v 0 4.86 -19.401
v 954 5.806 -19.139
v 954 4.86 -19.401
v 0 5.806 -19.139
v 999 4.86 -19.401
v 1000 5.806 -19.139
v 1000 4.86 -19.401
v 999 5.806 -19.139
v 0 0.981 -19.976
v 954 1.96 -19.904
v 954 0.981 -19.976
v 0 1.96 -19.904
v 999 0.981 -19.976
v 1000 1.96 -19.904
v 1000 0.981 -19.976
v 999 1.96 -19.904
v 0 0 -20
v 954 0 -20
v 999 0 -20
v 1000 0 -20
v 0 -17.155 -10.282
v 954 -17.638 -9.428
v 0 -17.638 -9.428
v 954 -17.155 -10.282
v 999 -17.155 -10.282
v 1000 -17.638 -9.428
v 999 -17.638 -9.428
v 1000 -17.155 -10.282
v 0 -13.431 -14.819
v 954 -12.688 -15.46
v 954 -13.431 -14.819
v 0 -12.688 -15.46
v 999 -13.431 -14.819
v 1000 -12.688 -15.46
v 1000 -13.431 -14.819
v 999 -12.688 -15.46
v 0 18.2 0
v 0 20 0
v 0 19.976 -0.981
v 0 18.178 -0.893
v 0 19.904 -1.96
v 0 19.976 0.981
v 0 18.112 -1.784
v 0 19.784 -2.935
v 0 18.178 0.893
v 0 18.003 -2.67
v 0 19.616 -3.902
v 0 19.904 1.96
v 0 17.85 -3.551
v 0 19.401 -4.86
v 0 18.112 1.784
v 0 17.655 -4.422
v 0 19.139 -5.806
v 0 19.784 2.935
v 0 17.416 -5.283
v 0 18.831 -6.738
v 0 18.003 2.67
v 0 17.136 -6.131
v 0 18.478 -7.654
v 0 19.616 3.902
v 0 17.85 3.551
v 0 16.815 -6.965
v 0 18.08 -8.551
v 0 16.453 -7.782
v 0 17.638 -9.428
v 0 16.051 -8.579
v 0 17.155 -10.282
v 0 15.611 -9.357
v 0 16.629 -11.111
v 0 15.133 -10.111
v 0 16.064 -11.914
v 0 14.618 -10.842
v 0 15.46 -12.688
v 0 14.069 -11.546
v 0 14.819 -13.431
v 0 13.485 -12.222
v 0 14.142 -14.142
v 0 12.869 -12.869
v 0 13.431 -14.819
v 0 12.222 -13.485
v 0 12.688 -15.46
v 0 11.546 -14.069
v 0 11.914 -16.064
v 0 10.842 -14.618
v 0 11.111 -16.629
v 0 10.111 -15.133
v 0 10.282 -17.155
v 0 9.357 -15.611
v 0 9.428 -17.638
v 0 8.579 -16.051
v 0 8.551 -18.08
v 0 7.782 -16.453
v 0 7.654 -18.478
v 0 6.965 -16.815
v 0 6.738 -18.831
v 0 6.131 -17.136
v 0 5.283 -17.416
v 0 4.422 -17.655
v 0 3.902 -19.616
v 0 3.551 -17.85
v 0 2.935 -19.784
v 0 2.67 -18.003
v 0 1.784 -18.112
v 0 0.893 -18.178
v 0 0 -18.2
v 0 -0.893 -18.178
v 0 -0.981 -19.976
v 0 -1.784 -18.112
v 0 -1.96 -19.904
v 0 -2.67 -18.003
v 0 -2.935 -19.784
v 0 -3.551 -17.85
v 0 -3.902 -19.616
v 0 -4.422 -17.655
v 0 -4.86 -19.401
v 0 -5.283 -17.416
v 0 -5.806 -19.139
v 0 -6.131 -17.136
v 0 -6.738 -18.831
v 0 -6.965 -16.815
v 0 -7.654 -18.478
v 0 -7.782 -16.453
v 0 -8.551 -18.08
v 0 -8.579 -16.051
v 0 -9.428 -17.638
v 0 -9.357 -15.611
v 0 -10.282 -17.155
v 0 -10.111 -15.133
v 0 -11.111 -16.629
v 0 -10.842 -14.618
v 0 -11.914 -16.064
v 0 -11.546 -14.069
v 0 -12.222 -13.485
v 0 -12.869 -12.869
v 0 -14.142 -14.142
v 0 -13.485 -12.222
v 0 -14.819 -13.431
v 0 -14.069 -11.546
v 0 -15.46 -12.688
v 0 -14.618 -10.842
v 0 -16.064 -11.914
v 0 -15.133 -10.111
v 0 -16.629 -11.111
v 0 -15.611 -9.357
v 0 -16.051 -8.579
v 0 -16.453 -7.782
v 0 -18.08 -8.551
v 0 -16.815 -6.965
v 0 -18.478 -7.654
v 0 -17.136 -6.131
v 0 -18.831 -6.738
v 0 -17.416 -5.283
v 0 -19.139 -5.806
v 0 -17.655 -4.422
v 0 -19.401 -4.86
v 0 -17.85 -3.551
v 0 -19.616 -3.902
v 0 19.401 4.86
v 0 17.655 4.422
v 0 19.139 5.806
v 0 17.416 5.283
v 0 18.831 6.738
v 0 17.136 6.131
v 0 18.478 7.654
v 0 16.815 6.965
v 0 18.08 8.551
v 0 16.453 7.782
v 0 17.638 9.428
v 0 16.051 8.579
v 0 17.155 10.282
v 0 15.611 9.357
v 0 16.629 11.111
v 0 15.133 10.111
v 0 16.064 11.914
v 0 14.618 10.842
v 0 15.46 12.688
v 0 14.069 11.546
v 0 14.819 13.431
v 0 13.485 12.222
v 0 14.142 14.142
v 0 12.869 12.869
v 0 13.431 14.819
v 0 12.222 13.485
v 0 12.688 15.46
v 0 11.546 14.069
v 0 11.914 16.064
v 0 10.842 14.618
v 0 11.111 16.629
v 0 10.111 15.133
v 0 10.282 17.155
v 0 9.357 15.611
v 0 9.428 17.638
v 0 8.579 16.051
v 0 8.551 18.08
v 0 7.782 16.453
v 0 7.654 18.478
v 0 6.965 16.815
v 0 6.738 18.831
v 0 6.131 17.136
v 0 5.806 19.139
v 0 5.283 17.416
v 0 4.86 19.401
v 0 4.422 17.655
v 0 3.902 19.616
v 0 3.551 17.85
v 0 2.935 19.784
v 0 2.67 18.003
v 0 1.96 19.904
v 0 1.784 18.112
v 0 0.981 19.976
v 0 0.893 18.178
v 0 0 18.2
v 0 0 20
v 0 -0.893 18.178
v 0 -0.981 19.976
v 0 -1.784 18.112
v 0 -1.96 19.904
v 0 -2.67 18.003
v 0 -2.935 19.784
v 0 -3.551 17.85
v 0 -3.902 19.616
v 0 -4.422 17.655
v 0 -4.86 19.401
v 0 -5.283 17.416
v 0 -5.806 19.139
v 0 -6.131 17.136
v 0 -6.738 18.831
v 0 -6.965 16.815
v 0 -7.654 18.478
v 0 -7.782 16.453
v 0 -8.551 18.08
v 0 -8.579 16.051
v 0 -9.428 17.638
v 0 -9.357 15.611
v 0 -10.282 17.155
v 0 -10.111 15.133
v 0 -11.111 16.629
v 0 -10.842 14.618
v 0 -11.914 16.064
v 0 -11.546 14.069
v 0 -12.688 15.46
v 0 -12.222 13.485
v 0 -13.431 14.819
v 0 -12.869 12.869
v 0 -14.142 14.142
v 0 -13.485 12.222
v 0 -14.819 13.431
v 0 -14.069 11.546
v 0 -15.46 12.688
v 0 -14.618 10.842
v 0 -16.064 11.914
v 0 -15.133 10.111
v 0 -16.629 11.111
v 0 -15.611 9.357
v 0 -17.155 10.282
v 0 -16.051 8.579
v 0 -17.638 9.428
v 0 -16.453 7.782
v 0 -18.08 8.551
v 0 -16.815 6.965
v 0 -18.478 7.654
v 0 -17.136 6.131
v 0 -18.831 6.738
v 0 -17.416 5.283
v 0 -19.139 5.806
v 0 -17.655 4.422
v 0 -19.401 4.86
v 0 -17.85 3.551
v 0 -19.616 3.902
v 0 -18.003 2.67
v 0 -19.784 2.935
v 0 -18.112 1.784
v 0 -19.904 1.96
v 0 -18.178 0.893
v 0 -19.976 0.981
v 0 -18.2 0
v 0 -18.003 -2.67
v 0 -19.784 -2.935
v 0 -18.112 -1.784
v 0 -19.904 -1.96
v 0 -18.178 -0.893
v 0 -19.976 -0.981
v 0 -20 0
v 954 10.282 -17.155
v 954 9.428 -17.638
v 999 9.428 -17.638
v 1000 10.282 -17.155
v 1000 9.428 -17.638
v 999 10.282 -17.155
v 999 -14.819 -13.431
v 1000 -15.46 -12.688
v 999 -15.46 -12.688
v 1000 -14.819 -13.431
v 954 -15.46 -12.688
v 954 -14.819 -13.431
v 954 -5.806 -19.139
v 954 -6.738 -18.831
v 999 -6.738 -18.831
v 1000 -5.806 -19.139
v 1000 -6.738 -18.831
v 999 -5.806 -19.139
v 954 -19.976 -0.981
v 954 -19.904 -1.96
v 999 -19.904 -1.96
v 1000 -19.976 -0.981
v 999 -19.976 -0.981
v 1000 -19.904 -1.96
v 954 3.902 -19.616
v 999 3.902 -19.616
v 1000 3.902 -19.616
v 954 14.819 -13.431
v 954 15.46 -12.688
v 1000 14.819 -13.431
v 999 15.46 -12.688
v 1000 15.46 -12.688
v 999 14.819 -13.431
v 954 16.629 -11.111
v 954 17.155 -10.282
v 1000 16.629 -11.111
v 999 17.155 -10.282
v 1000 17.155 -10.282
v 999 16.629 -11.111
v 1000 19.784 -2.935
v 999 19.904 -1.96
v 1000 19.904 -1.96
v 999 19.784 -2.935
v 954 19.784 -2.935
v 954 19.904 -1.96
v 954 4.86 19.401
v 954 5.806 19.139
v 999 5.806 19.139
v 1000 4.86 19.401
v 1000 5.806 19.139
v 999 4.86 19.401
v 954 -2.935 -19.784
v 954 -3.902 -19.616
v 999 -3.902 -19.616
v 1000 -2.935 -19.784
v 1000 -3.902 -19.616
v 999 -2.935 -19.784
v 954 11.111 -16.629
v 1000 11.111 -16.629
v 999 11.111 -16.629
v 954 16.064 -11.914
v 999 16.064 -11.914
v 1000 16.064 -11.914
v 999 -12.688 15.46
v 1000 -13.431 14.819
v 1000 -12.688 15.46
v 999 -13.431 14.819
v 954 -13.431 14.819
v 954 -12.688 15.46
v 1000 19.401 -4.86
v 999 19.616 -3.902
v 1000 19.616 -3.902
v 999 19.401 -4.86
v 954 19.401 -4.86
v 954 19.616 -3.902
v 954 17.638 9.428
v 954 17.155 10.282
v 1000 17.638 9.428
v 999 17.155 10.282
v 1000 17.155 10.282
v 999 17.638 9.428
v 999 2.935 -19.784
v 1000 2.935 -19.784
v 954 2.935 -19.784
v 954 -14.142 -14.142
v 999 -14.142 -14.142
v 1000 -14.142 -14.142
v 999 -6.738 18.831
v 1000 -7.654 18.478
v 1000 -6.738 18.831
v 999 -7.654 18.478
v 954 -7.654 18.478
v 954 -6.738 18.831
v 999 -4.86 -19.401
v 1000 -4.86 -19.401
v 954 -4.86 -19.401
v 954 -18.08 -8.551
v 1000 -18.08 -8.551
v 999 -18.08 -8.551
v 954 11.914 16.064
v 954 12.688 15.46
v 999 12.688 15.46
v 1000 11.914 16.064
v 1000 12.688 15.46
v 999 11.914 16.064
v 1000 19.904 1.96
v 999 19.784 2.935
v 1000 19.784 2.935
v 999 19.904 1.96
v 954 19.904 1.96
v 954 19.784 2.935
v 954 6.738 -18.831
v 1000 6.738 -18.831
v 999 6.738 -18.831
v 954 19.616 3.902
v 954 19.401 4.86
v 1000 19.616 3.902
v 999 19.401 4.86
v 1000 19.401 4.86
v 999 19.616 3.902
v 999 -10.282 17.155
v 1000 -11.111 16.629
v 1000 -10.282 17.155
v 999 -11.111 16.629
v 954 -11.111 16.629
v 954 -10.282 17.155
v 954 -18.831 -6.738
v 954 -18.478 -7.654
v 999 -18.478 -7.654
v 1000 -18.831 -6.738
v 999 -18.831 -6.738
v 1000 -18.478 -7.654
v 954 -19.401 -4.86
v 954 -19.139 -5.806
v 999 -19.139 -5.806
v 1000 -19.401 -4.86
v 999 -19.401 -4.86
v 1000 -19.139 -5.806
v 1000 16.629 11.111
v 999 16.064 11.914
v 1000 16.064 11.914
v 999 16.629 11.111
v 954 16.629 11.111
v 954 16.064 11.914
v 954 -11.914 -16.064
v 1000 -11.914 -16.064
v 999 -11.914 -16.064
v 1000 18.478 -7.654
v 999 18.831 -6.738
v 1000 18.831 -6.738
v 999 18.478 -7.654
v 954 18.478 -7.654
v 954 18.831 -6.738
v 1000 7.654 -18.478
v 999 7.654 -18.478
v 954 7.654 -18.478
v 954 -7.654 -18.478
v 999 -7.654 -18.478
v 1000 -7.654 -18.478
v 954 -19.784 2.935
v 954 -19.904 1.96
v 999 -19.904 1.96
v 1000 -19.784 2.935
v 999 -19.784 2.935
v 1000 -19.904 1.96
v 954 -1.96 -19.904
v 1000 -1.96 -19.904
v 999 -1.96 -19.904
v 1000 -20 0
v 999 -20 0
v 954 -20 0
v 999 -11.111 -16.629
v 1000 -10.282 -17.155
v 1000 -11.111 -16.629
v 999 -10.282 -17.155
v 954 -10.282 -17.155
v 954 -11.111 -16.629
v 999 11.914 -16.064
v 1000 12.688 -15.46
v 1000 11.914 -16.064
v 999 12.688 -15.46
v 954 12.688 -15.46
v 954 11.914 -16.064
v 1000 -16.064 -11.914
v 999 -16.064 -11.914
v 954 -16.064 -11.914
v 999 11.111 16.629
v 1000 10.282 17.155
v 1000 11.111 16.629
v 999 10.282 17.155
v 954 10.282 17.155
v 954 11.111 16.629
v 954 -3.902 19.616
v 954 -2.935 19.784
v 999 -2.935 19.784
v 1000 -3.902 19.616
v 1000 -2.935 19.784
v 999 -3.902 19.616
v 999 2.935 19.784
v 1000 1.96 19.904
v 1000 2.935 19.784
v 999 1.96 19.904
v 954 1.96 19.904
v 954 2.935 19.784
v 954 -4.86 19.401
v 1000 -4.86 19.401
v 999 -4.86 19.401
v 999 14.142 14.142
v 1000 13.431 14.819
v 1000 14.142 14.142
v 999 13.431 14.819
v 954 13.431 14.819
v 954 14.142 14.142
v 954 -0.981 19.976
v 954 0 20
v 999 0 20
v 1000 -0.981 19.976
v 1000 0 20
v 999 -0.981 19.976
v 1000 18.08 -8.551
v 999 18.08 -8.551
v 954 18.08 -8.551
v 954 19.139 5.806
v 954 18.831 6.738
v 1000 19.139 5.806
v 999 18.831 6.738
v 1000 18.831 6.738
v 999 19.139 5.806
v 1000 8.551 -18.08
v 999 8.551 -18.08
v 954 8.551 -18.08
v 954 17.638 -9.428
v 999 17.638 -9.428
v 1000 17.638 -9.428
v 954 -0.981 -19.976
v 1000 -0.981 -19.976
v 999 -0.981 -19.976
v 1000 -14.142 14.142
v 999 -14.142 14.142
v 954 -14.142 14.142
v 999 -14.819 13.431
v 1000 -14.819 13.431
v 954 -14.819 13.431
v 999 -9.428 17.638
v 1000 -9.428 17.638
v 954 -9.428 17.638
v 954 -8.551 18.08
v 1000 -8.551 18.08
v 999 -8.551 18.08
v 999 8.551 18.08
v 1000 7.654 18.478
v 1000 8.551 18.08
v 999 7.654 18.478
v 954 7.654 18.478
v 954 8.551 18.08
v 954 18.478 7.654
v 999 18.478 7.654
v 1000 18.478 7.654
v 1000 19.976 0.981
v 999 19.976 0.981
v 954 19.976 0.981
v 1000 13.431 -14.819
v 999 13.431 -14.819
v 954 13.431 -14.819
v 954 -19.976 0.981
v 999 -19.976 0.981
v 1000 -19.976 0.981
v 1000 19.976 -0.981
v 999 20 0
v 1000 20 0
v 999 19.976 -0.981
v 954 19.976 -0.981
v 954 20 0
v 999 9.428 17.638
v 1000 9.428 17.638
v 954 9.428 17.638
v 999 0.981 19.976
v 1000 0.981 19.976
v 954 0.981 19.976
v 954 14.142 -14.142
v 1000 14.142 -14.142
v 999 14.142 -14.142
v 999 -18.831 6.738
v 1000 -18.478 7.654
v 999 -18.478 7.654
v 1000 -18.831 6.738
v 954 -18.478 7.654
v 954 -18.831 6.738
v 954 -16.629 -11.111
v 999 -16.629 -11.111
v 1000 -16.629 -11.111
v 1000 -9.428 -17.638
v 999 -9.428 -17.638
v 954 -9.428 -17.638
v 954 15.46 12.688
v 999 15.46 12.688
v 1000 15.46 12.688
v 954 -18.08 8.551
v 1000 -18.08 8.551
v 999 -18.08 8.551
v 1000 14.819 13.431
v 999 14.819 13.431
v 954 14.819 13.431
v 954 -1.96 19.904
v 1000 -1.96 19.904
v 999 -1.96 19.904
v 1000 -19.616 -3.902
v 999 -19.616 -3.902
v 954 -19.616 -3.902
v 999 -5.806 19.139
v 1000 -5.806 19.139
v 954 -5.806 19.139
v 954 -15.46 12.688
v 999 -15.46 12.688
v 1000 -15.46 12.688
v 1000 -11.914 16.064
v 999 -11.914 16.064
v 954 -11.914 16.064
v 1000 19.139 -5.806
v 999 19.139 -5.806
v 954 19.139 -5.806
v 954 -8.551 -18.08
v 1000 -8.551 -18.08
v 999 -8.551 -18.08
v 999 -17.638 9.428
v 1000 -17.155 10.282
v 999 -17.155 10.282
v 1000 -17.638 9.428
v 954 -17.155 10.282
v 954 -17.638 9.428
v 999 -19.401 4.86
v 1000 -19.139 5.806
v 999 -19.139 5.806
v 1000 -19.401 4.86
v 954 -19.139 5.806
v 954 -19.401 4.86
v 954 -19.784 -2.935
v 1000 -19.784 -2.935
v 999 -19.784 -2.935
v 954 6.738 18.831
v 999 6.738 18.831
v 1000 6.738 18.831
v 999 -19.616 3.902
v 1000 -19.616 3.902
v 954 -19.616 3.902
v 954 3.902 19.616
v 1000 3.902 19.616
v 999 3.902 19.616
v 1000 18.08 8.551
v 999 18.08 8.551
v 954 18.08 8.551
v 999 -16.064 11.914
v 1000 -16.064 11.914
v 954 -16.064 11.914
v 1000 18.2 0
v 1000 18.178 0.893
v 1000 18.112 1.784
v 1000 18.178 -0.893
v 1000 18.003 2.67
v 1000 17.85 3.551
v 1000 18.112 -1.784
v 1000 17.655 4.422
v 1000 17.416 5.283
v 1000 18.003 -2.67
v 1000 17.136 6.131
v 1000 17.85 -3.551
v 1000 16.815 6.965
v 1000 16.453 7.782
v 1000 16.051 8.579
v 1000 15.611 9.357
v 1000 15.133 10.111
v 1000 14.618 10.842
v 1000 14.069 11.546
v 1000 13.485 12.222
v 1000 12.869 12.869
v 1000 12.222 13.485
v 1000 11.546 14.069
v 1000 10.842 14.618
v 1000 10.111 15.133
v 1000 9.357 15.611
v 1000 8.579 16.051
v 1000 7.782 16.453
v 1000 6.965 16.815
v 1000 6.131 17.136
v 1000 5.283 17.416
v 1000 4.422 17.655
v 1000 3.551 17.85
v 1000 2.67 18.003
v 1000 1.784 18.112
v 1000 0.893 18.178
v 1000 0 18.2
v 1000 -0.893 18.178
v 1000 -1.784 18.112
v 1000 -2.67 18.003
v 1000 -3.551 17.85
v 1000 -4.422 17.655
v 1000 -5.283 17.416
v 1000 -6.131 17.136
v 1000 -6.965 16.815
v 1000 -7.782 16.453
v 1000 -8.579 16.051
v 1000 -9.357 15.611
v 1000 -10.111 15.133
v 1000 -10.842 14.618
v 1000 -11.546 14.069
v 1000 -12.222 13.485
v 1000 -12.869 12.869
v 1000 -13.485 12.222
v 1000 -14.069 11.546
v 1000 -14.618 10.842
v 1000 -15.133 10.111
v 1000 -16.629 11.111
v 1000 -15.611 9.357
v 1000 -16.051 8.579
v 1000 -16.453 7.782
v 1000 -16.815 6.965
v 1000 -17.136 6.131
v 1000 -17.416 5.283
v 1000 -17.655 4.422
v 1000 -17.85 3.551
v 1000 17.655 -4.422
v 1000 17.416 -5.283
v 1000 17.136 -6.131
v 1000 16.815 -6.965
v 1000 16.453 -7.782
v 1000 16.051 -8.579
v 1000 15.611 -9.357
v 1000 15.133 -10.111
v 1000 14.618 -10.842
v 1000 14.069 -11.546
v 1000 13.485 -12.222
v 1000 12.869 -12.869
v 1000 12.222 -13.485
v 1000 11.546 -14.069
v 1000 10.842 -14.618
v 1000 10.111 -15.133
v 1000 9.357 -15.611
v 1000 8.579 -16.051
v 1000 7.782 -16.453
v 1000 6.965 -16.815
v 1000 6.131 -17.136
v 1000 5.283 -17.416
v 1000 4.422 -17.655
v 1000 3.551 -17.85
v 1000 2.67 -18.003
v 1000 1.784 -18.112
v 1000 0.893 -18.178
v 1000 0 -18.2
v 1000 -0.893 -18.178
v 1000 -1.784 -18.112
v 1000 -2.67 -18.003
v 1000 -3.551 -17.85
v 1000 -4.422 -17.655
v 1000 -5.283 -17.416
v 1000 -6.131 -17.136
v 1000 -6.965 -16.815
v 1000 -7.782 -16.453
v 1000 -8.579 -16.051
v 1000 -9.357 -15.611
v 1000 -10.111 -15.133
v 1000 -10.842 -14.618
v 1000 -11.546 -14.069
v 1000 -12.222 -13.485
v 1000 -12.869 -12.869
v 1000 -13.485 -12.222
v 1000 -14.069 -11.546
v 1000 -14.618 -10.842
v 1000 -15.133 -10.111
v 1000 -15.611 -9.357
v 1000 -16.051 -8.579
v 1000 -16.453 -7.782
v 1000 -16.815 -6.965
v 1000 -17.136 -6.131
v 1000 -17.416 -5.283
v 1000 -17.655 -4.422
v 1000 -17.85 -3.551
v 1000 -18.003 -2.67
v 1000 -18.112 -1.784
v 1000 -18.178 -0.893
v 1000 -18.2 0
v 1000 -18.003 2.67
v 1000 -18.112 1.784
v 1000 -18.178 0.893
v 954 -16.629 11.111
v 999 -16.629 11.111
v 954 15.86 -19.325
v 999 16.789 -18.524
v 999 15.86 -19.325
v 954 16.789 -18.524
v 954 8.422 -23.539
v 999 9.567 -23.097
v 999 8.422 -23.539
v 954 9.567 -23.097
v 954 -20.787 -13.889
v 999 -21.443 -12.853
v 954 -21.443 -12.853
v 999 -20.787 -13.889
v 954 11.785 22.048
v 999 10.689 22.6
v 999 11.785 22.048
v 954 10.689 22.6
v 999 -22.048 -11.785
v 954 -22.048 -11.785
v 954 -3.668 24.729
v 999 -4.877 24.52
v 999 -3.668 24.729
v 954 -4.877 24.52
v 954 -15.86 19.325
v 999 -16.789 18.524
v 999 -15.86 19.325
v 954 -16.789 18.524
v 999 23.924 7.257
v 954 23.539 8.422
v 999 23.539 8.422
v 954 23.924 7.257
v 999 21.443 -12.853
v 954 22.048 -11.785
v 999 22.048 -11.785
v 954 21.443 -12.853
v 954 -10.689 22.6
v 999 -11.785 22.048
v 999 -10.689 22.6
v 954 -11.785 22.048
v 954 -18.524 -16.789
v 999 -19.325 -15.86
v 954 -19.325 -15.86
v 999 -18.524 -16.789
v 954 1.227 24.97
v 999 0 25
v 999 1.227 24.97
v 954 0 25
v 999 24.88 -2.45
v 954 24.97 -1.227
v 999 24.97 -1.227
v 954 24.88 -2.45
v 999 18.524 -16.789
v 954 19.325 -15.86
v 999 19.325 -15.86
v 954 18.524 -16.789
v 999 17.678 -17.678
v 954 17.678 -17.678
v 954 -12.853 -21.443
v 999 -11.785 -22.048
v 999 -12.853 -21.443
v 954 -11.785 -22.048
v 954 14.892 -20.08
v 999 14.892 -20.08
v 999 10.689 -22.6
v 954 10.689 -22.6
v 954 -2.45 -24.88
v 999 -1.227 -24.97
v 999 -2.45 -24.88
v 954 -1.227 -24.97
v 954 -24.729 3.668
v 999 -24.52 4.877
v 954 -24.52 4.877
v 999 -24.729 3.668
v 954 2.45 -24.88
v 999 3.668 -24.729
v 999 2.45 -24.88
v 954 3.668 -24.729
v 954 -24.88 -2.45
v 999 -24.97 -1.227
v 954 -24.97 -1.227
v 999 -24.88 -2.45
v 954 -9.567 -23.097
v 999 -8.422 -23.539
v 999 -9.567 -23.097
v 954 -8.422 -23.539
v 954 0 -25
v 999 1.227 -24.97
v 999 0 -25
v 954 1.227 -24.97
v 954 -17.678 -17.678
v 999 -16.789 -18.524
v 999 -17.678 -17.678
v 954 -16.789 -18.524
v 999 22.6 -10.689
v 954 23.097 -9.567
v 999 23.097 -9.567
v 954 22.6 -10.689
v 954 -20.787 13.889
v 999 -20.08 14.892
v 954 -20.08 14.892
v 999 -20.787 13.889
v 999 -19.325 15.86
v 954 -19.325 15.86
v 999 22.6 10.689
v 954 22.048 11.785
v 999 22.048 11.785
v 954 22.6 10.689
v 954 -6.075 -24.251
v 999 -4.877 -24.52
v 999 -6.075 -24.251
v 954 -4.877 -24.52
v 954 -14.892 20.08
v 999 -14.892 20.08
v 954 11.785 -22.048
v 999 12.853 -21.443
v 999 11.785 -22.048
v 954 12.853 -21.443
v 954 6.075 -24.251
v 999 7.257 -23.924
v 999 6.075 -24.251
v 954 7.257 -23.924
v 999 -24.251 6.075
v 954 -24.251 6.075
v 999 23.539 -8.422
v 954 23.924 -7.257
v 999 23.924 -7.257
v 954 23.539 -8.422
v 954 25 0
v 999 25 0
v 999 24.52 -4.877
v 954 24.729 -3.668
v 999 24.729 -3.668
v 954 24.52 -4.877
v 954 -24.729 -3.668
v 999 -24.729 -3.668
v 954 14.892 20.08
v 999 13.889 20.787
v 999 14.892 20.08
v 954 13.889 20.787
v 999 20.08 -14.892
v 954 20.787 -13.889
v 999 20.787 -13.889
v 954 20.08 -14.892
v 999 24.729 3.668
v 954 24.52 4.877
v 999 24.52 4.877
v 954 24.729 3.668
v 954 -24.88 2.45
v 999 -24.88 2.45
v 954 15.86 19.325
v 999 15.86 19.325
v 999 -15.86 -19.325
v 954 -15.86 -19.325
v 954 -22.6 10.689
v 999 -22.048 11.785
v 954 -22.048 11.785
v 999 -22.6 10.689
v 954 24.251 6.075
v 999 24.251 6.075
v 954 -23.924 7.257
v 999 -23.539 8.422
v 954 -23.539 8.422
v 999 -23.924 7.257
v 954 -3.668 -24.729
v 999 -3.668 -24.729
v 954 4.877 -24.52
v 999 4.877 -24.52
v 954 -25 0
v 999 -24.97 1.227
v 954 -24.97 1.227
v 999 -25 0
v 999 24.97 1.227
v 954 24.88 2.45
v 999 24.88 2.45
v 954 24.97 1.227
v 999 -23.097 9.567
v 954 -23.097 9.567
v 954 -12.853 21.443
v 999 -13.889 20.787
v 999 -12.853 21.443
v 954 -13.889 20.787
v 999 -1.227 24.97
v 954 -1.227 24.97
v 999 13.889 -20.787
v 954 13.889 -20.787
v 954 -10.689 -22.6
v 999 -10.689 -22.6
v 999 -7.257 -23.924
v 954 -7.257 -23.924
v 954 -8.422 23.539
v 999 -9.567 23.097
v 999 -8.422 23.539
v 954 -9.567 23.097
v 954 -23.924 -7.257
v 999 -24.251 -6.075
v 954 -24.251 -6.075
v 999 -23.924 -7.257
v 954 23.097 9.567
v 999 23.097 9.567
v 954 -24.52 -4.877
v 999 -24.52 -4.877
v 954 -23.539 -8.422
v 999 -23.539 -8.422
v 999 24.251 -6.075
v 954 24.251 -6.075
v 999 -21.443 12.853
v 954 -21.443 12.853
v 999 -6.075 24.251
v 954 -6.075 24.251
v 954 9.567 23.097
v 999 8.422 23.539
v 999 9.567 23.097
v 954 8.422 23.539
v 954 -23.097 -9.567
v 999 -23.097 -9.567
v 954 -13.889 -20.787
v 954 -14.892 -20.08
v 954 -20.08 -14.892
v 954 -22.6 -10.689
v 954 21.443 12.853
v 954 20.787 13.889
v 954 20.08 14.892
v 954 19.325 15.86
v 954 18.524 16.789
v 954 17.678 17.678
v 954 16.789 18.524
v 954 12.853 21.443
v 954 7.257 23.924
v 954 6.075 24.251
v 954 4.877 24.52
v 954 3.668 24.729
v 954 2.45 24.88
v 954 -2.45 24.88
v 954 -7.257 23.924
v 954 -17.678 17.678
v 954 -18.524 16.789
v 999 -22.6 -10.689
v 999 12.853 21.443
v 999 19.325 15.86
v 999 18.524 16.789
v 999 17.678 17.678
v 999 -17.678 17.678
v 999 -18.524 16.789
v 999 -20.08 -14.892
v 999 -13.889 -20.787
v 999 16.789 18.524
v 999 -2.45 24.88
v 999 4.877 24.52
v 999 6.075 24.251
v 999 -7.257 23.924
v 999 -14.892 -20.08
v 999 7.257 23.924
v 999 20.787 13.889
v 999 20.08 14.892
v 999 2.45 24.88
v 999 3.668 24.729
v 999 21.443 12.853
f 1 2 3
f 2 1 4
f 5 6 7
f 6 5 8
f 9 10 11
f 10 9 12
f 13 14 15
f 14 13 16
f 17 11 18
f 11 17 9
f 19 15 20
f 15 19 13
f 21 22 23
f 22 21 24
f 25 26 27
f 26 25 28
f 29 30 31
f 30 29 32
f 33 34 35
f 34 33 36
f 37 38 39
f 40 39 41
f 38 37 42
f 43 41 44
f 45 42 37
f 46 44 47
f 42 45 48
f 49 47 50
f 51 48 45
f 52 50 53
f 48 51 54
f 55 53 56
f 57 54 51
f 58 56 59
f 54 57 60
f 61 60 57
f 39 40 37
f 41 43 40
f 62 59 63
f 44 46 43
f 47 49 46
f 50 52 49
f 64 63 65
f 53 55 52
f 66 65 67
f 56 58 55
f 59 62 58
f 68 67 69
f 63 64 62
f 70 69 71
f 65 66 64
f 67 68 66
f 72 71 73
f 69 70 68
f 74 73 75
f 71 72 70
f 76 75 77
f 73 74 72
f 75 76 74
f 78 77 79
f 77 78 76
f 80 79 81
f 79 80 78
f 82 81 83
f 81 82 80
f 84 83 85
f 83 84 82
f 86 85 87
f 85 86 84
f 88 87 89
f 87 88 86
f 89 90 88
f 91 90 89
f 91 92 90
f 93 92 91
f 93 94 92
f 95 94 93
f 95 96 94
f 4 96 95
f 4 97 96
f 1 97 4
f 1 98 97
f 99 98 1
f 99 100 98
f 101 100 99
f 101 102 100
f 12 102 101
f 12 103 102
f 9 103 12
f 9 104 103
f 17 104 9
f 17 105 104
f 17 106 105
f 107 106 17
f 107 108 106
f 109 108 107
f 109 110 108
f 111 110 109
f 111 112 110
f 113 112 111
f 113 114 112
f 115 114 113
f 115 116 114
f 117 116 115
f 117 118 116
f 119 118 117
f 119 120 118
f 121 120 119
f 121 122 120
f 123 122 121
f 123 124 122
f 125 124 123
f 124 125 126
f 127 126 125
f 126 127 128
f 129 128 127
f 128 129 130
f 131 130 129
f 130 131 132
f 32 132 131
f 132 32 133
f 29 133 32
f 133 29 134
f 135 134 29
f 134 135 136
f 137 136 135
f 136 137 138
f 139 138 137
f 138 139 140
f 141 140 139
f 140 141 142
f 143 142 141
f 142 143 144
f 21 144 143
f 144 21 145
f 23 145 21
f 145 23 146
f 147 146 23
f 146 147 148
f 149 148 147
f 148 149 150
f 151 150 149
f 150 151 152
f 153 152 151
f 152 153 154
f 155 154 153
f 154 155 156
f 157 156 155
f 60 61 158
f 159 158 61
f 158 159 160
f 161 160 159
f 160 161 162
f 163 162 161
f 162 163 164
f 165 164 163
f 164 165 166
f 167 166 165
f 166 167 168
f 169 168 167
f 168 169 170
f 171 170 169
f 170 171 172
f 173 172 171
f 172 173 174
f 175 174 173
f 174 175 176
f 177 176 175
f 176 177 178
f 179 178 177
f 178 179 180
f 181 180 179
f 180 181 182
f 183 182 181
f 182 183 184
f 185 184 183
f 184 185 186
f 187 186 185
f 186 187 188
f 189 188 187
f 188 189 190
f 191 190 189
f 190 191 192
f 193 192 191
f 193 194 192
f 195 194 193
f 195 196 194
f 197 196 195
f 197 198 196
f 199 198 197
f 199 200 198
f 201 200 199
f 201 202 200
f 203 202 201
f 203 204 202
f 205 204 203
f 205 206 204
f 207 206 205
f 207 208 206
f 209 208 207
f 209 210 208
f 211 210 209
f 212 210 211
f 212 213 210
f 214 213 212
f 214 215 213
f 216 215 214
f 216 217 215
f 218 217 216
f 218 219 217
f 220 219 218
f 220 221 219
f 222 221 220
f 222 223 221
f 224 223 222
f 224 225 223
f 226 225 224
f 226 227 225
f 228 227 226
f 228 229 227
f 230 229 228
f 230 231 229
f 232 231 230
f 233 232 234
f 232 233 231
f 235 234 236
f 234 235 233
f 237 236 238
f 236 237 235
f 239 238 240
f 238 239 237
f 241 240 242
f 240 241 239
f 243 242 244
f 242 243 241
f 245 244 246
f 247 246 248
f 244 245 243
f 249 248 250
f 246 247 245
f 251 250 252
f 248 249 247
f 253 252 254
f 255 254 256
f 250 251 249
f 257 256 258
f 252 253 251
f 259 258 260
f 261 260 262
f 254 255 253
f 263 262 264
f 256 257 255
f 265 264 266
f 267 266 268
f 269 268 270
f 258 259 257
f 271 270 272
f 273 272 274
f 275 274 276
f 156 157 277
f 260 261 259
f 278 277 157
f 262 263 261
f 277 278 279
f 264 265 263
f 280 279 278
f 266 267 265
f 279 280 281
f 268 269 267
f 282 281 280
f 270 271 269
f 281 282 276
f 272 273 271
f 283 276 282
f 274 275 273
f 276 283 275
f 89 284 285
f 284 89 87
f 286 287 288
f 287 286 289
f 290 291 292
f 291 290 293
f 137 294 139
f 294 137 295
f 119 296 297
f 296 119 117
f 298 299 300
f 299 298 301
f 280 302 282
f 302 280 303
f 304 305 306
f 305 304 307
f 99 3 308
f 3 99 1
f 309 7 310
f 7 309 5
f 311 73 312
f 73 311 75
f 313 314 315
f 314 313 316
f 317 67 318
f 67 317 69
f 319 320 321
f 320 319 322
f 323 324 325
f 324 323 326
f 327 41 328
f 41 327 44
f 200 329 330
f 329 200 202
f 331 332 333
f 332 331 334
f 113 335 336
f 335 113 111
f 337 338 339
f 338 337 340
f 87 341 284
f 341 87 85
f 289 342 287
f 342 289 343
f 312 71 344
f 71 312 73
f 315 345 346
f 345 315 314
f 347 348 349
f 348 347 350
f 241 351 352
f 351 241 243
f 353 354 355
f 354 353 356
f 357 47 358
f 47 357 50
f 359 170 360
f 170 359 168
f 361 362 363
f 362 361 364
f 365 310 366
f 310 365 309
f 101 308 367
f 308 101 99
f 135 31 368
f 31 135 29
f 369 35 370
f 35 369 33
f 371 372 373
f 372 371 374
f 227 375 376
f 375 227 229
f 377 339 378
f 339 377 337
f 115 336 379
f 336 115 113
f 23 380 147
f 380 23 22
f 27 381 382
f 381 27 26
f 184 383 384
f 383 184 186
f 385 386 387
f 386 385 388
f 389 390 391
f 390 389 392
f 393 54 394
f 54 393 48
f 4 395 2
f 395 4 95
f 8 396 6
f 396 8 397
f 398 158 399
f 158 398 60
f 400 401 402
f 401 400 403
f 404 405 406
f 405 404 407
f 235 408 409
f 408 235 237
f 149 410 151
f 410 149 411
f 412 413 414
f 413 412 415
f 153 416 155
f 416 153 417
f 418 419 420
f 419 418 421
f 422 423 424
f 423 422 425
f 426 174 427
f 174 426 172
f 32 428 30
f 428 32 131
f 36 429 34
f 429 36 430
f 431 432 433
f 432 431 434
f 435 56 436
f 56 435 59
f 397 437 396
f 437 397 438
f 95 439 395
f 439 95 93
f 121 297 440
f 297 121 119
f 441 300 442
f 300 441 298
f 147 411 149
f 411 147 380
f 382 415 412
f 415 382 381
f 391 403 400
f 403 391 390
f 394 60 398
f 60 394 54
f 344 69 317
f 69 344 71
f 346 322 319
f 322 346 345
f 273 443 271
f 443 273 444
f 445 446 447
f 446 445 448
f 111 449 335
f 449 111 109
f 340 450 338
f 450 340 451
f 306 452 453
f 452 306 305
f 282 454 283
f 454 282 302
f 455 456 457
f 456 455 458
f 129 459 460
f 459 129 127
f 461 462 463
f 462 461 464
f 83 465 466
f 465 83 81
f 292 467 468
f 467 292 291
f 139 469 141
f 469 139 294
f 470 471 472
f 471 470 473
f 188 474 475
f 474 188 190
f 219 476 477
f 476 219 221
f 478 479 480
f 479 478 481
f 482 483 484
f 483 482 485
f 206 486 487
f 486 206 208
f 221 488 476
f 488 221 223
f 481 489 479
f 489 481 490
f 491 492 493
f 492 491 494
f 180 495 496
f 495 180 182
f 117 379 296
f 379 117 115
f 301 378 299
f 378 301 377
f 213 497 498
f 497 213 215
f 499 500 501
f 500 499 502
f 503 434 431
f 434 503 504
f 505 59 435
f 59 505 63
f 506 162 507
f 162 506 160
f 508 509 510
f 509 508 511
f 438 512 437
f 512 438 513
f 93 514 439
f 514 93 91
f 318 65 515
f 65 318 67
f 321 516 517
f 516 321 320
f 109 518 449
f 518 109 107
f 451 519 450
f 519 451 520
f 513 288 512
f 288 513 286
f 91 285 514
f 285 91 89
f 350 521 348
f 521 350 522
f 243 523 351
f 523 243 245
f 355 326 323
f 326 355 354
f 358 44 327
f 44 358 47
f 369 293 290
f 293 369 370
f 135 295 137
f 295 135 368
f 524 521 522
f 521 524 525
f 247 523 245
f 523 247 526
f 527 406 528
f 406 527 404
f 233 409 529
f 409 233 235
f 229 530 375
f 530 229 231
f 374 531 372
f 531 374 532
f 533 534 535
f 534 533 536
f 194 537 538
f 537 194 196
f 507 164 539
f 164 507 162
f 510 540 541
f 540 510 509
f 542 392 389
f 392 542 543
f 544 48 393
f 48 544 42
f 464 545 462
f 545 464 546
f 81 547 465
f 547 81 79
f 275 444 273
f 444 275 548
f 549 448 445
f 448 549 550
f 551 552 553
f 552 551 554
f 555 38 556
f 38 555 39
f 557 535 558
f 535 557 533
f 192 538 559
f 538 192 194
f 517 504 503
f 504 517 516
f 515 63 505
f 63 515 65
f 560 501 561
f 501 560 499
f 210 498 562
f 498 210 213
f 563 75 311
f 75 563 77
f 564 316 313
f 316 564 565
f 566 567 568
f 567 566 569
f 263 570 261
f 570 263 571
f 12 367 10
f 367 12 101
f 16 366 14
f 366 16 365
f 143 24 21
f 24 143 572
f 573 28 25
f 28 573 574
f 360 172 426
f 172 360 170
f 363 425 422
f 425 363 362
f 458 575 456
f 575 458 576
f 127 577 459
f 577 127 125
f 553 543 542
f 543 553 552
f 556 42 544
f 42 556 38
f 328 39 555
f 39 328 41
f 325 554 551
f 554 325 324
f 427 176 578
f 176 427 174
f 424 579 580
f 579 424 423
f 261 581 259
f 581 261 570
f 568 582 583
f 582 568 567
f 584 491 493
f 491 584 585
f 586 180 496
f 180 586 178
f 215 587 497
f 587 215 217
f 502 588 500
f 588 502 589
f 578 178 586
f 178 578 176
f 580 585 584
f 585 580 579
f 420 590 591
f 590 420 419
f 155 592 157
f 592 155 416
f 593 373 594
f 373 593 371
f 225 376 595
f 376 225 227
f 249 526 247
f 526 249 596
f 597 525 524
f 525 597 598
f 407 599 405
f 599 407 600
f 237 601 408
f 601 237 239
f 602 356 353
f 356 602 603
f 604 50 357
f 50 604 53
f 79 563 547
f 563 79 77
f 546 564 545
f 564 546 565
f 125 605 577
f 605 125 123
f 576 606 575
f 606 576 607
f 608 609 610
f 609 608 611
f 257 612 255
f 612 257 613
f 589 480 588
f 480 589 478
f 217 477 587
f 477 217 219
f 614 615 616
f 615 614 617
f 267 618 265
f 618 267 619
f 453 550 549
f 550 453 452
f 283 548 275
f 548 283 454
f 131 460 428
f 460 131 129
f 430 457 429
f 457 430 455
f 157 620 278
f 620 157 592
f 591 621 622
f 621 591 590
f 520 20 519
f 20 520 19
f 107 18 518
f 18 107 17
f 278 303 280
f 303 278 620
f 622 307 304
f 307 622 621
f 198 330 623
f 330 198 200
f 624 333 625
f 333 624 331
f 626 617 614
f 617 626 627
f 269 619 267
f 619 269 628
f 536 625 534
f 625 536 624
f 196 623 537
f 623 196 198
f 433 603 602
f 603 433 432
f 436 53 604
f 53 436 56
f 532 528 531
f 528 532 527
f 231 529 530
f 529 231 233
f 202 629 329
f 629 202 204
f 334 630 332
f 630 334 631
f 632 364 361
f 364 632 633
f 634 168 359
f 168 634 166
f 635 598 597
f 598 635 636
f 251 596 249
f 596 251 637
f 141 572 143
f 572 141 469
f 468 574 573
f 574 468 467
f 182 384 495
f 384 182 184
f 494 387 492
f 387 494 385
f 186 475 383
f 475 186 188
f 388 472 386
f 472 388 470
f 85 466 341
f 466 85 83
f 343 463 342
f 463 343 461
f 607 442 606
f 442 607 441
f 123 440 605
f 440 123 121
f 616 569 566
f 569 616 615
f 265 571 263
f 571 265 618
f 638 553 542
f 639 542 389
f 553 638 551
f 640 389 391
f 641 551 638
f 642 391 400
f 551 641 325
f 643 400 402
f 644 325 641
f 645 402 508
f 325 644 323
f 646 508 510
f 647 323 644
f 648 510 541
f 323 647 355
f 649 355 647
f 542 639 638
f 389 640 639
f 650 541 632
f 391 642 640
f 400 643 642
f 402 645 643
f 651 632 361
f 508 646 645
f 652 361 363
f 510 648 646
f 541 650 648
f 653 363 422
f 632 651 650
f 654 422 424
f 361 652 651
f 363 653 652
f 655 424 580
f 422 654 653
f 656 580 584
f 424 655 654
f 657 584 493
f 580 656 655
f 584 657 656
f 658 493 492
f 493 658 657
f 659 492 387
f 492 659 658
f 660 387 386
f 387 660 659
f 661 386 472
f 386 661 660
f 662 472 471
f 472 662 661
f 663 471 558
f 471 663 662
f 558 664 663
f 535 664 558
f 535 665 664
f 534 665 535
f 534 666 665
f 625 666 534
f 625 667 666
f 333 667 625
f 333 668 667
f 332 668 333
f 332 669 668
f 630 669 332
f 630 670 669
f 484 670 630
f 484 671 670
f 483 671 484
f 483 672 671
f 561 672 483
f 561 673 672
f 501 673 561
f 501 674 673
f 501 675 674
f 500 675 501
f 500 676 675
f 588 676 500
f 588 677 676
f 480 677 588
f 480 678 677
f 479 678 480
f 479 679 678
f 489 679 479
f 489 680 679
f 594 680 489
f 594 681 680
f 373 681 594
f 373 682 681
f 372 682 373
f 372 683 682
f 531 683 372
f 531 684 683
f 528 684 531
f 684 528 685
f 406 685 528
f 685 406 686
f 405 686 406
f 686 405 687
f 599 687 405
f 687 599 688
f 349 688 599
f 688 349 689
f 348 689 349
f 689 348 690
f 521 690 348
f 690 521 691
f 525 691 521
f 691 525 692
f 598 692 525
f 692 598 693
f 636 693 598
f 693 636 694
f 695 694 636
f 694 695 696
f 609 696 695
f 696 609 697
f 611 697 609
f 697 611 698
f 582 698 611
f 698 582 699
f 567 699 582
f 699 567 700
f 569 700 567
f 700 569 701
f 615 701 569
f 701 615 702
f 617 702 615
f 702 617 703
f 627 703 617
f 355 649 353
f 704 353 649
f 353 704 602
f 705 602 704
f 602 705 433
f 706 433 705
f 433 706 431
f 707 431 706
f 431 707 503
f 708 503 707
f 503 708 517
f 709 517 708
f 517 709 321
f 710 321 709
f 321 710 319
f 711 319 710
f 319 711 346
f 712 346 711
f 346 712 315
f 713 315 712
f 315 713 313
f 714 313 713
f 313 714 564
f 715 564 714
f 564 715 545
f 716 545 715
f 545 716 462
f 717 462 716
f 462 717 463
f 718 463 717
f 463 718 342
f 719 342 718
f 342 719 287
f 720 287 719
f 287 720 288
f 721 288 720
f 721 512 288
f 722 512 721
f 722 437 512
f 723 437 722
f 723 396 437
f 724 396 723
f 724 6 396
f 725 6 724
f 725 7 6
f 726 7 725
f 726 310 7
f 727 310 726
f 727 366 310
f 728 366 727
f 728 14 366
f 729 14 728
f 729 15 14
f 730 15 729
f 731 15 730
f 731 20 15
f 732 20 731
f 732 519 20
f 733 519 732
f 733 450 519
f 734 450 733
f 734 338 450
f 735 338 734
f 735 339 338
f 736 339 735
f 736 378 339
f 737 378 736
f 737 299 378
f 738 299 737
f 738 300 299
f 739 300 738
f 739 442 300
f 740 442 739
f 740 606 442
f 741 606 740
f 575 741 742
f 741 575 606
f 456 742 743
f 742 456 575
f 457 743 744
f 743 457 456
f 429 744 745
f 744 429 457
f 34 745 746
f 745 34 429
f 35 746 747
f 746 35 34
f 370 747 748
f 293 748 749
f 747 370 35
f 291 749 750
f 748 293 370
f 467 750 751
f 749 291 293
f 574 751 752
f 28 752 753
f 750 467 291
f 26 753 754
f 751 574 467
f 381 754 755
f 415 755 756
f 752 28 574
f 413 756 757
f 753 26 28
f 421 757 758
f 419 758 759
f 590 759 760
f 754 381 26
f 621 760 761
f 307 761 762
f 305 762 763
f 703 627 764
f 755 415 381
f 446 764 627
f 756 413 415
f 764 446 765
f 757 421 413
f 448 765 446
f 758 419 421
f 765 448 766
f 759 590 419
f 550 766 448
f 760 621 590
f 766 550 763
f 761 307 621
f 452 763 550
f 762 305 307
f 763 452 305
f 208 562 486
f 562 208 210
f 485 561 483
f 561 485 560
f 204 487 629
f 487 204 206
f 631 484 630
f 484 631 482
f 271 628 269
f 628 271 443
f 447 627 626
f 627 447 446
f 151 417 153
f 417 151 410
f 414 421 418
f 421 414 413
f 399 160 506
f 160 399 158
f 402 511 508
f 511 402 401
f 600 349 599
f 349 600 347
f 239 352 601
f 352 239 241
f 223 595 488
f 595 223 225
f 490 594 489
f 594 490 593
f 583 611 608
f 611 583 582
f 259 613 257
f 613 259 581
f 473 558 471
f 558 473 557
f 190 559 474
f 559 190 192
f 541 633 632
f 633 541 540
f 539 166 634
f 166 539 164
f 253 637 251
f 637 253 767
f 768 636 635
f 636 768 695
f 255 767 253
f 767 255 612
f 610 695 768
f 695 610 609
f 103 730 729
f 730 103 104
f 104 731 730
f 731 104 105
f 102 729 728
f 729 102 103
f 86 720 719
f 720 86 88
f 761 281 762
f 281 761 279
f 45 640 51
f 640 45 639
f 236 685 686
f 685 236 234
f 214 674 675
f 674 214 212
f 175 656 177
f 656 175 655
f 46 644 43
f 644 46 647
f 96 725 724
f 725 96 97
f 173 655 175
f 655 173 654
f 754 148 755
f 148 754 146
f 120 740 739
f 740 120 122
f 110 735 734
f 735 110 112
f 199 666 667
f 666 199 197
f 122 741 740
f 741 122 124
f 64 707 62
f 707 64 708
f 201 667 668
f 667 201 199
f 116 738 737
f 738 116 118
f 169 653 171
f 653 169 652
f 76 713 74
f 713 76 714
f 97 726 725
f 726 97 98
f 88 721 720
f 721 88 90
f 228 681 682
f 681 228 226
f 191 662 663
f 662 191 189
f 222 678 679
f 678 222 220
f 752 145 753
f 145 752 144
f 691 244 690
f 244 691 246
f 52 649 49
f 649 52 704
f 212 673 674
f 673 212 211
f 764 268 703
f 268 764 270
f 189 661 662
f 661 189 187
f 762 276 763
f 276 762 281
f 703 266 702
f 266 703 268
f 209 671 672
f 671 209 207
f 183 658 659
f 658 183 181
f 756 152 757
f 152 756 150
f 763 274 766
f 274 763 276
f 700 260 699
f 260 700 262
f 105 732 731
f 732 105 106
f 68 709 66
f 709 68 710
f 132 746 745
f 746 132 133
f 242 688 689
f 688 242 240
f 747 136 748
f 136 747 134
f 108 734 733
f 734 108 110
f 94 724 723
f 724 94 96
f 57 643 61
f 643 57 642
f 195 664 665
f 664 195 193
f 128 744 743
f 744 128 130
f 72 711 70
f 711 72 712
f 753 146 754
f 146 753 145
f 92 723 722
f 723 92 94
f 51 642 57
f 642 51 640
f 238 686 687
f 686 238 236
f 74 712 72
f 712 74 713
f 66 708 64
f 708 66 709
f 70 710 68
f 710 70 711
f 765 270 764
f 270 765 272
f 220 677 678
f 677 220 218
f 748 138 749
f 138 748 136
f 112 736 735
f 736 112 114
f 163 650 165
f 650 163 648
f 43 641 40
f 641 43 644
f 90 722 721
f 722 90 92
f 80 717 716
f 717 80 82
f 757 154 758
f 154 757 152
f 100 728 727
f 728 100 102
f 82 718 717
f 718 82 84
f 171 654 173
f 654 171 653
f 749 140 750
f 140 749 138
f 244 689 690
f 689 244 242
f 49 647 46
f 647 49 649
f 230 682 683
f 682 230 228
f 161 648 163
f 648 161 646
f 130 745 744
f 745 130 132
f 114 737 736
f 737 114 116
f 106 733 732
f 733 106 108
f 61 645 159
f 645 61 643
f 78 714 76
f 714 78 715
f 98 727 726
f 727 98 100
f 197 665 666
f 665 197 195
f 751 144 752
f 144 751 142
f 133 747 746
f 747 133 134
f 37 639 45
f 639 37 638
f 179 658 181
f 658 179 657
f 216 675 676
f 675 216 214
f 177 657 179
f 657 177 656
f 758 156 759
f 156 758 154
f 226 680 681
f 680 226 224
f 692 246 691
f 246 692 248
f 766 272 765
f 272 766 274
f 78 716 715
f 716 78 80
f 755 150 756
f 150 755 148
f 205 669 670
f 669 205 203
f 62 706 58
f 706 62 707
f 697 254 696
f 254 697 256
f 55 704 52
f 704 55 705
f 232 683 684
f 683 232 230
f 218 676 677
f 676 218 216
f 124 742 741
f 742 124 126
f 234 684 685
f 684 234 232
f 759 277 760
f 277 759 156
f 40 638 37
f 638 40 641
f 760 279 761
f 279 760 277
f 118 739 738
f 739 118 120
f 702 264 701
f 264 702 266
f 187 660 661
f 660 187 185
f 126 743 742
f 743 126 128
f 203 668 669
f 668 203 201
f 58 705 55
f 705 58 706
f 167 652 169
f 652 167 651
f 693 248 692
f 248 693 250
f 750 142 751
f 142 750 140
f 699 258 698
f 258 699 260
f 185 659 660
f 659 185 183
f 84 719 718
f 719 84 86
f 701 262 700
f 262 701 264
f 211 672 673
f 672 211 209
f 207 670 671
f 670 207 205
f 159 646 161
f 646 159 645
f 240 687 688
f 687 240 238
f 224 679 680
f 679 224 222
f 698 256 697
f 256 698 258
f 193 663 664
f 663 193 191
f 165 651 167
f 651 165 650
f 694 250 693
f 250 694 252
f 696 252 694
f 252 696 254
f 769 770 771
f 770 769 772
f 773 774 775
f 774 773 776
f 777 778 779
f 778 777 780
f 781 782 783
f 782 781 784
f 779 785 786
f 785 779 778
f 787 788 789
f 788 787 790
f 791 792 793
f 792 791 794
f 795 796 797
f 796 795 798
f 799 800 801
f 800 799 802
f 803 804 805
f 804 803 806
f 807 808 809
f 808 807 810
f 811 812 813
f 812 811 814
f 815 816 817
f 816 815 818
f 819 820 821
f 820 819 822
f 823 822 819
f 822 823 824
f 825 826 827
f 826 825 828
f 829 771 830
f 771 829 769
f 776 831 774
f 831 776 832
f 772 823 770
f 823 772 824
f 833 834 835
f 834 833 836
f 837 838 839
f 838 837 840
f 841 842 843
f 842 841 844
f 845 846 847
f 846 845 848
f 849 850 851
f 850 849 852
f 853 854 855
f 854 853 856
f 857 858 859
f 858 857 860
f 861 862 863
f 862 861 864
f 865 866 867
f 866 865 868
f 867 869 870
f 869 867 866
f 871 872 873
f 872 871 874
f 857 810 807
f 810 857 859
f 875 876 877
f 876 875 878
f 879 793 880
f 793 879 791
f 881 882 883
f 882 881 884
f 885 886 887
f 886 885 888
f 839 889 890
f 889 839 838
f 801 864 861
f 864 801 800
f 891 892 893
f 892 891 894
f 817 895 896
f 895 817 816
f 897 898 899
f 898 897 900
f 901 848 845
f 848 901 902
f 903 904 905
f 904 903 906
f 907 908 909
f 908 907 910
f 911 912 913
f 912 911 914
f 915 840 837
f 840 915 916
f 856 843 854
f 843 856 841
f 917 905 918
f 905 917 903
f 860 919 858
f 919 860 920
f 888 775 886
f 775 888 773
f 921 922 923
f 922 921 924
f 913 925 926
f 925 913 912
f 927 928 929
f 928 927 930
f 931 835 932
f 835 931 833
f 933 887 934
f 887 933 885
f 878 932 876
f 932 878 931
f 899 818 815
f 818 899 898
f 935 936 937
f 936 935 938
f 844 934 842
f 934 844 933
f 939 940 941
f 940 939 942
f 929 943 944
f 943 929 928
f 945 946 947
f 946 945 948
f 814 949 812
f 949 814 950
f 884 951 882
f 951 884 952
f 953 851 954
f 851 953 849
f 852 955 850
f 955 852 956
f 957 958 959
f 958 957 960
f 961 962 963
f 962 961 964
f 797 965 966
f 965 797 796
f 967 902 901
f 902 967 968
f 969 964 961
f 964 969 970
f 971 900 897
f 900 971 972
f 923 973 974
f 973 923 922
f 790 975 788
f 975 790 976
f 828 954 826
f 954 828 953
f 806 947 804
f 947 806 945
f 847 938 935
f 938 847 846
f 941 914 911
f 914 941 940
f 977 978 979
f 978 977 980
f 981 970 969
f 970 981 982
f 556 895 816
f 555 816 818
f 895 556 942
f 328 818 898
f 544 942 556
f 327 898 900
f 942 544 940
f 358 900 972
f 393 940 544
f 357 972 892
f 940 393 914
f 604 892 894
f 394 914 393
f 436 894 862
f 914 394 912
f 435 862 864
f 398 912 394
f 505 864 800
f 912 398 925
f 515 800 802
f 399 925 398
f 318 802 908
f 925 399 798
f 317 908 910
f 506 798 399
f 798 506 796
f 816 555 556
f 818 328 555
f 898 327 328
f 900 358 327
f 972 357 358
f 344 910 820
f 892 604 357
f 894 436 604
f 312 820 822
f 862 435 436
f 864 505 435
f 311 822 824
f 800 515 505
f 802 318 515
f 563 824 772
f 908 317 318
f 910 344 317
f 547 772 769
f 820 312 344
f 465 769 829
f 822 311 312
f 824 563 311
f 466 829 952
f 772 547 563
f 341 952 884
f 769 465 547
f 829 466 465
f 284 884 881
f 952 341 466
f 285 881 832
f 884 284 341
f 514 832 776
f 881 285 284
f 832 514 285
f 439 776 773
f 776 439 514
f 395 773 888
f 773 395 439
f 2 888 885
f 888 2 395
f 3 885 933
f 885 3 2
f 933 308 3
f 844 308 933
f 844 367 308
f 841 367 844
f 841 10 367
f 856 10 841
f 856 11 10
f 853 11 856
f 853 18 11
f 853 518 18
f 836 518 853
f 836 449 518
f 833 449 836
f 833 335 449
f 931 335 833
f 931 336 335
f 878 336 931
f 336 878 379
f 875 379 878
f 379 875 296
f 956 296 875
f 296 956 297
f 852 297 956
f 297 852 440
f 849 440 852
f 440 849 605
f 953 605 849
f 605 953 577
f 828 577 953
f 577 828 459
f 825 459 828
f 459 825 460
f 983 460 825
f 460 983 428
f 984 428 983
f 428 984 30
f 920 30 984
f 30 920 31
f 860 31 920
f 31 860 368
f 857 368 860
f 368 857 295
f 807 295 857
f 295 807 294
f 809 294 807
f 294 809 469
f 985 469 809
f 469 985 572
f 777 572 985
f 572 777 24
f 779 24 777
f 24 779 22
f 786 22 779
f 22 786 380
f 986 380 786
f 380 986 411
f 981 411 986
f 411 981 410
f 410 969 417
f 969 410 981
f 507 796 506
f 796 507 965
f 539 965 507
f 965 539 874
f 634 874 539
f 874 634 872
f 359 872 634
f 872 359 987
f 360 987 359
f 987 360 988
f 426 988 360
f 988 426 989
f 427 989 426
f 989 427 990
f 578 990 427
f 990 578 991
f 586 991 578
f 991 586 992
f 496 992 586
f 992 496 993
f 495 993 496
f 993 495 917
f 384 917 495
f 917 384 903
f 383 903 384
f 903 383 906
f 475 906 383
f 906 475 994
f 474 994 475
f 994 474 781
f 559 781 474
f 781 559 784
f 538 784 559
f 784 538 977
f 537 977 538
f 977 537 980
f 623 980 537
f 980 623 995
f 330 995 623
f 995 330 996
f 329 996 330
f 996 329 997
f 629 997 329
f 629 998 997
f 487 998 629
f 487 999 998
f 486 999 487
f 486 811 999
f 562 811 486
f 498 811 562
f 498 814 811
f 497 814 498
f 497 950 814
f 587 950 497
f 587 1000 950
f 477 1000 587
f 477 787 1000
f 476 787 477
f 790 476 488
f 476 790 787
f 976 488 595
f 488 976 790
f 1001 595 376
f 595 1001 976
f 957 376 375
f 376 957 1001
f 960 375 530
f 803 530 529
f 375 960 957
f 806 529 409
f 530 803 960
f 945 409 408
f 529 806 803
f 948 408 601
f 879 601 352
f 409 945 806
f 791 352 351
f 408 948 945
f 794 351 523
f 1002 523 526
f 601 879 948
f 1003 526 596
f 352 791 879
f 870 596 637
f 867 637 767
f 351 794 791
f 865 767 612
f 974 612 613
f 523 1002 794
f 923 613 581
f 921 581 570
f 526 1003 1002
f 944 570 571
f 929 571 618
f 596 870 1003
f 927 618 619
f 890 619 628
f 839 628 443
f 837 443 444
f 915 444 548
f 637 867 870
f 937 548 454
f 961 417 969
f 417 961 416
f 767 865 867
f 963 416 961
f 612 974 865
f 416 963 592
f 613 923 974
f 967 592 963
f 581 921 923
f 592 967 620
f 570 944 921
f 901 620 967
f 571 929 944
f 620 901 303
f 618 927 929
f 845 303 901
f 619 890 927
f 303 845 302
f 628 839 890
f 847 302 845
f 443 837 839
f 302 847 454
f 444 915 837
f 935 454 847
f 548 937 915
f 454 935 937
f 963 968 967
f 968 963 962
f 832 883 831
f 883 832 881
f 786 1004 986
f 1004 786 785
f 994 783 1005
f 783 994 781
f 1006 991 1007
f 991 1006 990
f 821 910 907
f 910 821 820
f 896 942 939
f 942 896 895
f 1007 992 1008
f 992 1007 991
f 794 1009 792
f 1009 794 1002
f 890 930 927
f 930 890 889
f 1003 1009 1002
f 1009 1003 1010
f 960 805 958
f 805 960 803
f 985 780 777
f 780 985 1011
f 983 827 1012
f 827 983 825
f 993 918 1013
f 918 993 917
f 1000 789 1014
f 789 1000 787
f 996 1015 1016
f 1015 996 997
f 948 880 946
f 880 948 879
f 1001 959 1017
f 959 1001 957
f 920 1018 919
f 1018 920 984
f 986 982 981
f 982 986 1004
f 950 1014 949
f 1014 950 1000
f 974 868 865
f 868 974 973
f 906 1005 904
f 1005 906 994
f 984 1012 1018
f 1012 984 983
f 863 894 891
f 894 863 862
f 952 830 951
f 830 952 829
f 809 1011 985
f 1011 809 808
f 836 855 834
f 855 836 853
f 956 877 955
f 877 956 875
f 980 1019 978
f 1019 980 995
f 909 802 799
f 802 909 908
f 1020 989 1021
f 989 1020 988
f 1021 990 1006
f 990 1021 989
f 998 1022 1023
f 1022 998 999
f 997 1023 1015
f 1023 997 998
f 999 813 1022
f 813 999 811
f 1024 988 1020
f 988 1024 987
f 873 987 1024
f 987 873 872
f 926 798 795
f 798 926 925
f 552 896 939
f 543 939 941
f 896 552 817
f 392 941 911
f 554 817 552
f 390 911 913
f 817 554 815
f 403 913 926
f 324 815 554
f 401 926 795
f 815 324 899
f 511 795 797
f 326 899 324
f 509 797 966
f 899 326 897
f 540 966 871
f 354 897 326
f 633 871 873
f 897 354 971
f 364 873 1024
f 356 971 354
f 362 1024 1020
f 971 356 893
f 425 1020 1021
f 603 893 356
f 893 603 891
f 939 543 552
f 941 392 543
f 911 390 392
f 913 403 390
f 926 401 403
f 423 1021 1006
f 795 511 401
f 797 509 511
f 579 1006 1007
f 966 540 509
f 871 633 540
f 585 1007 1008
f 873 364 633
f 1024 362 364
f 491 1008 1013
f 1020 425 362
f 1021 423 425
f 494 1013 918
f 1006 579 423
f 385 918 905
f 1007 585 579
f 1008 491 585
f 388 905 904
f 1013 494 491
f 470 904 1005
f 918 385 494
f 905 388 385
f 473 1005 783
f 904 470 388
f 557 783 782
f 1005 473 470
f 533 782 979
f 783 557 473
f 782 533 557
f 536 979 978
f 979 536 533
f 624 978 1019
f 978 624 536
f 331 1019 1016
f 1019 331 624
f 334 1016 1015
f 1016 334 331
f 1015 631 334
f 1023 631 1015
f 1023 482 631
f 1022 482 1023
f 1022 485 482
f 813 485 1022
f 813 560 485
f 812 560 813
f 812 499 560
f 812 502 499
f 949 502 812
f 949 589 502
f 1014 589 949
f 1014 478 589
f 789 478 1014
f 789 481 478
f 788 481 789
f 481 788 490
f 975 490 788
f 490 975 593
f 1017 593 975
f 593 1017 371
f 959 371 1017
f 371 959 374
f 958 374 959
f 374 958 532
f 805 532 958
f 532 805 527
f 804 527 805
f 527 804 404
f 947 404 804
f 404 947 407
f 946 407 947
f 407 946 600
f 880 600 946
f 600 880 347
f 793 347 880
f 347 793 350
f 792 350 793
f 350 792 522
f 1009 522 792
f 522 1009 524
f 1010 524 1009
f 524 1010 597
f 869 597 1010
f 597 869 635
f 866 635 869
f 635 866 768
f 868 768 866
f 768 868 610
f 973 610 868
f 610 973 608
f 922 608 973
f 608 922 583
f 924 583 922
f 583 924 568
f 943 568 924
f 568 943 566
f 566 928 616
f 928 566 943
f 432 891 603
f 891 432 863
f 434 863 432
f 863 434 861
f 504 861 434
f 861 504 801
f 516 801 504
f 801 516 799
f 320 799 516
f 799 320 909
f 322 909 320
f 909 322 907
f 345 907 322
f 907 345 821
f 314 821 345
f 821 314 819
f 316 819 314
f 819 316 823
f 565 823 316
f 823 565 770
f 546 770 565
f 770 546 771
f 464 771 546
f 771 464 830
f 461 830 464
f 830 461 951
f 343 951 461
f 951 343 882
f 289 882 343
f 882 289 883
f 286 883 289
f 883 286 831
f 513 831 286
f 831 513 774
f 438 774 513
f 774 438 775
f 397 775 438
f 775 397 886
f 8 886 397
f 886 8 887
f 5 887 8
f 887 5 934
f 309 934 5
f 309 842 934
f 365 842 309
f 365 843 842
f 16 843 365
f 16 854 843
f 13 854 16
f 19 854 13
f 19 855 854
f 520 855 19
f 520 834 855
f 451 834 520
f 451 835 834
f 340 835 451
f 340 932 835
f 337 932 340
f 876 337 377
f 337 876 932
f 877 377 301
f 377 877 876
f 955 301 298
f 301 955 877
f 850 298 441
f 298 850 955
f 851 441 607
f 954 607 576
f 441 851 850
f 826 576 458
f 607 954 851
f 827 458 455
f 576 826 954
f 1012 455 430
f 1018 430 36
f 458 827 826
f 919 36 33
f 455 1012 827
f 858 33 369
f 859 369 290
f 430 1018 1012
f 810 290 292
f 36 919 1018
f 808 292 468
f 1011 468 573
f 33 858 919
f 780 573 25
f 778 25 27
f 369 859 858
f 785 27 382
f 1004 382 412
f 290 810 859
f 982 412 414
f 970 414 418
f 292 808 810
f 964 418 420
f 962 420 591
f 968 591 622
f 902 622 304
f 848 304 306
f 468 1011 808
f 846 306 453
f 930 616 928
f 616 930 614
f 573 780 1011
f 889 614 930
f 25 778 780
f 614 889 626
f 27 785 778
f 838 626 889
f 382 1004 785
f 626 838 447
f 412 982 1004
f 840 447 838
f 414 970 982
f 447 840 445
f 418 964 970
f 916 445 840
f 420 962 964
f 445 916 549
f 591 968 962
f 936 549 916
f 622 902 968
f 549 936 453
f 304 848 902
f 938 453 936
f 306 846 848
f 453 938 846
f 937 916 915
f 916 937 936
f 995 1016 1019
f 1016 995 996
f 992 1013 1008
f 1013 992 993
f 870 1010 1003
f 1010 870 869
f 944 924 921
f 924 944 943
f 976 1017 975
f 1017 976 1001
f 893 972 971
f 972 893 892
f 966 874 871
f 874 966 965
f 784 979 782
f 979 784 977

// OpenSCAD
// Parameters
length_mm = 1000; //[500:2000:10]
ht40_outer_diameter = 40; //[30:80:1]
ht40_wall_thickness = 1.8; //[1:4:0.1]
fitting_length = 45; //[25:90:1]
fitting_od_scale = 1.25; //[1.05:1.6:0.01]
socket_extra_clearance = 0.4; //[0.1:1.2:0.05]
socket_wall_extra = 1.2; //[0.2:3:0.1]
connection_overlap = 1; //[0.5:2:0.1]

$fn = 128;

// Module for the HT Pipe (axis along X so orthographic front/back/left/right show the length)
module ht_pipe() {
  od = ht40_outer_diameter;
  r_out = od/2;
  r_in  = r_out - ht40_wall_thickness;

  fit_od = od * fitting_od_scale;
  r_fit_out = fit_od/2;

  // Socket inner radius: slightly larger than pipe OD/2 minus wall thickness, plus clearance
  r_socket_in = r_in + socket_extra_clearance;

  // Ensure socket has at least some wall thickness
  r_socket_in_clamped = min(r_socket_in, r_fit_out - 0.2);

  // Place socket at +X end, overlapping into main pipe by connection_overlap
  socket_x0 = length_mm - fitting_length - connection_overlap;

  color([0.85, 0.85, 0.8])
  rotate([0, 90, 0])  // make pipe run along X
  union() {
    // Main pipe body (hollow)
    difference() {
      cylinder(h=length_mm, r=r_out, center=false);
      translate([0, 0, -0.01])
        cylinder(h=length_mm + 0.02, r=r_in, center=false);
    }

    // End socket/fitting (hollow), connected via overlap
    translate([0, 0, socket_x0])
      difference() {
        cylinder(h=fitting_length, r=r_fit_out, center=false);
        translate([0, 0, -0.01])
          cylinder(h=fitting_length + 0.02, r=r_socket_in_clamped, center=false);
      }
  }
}

// Assembly
module assembly() {
  ht_pipe();
}

assembly();
